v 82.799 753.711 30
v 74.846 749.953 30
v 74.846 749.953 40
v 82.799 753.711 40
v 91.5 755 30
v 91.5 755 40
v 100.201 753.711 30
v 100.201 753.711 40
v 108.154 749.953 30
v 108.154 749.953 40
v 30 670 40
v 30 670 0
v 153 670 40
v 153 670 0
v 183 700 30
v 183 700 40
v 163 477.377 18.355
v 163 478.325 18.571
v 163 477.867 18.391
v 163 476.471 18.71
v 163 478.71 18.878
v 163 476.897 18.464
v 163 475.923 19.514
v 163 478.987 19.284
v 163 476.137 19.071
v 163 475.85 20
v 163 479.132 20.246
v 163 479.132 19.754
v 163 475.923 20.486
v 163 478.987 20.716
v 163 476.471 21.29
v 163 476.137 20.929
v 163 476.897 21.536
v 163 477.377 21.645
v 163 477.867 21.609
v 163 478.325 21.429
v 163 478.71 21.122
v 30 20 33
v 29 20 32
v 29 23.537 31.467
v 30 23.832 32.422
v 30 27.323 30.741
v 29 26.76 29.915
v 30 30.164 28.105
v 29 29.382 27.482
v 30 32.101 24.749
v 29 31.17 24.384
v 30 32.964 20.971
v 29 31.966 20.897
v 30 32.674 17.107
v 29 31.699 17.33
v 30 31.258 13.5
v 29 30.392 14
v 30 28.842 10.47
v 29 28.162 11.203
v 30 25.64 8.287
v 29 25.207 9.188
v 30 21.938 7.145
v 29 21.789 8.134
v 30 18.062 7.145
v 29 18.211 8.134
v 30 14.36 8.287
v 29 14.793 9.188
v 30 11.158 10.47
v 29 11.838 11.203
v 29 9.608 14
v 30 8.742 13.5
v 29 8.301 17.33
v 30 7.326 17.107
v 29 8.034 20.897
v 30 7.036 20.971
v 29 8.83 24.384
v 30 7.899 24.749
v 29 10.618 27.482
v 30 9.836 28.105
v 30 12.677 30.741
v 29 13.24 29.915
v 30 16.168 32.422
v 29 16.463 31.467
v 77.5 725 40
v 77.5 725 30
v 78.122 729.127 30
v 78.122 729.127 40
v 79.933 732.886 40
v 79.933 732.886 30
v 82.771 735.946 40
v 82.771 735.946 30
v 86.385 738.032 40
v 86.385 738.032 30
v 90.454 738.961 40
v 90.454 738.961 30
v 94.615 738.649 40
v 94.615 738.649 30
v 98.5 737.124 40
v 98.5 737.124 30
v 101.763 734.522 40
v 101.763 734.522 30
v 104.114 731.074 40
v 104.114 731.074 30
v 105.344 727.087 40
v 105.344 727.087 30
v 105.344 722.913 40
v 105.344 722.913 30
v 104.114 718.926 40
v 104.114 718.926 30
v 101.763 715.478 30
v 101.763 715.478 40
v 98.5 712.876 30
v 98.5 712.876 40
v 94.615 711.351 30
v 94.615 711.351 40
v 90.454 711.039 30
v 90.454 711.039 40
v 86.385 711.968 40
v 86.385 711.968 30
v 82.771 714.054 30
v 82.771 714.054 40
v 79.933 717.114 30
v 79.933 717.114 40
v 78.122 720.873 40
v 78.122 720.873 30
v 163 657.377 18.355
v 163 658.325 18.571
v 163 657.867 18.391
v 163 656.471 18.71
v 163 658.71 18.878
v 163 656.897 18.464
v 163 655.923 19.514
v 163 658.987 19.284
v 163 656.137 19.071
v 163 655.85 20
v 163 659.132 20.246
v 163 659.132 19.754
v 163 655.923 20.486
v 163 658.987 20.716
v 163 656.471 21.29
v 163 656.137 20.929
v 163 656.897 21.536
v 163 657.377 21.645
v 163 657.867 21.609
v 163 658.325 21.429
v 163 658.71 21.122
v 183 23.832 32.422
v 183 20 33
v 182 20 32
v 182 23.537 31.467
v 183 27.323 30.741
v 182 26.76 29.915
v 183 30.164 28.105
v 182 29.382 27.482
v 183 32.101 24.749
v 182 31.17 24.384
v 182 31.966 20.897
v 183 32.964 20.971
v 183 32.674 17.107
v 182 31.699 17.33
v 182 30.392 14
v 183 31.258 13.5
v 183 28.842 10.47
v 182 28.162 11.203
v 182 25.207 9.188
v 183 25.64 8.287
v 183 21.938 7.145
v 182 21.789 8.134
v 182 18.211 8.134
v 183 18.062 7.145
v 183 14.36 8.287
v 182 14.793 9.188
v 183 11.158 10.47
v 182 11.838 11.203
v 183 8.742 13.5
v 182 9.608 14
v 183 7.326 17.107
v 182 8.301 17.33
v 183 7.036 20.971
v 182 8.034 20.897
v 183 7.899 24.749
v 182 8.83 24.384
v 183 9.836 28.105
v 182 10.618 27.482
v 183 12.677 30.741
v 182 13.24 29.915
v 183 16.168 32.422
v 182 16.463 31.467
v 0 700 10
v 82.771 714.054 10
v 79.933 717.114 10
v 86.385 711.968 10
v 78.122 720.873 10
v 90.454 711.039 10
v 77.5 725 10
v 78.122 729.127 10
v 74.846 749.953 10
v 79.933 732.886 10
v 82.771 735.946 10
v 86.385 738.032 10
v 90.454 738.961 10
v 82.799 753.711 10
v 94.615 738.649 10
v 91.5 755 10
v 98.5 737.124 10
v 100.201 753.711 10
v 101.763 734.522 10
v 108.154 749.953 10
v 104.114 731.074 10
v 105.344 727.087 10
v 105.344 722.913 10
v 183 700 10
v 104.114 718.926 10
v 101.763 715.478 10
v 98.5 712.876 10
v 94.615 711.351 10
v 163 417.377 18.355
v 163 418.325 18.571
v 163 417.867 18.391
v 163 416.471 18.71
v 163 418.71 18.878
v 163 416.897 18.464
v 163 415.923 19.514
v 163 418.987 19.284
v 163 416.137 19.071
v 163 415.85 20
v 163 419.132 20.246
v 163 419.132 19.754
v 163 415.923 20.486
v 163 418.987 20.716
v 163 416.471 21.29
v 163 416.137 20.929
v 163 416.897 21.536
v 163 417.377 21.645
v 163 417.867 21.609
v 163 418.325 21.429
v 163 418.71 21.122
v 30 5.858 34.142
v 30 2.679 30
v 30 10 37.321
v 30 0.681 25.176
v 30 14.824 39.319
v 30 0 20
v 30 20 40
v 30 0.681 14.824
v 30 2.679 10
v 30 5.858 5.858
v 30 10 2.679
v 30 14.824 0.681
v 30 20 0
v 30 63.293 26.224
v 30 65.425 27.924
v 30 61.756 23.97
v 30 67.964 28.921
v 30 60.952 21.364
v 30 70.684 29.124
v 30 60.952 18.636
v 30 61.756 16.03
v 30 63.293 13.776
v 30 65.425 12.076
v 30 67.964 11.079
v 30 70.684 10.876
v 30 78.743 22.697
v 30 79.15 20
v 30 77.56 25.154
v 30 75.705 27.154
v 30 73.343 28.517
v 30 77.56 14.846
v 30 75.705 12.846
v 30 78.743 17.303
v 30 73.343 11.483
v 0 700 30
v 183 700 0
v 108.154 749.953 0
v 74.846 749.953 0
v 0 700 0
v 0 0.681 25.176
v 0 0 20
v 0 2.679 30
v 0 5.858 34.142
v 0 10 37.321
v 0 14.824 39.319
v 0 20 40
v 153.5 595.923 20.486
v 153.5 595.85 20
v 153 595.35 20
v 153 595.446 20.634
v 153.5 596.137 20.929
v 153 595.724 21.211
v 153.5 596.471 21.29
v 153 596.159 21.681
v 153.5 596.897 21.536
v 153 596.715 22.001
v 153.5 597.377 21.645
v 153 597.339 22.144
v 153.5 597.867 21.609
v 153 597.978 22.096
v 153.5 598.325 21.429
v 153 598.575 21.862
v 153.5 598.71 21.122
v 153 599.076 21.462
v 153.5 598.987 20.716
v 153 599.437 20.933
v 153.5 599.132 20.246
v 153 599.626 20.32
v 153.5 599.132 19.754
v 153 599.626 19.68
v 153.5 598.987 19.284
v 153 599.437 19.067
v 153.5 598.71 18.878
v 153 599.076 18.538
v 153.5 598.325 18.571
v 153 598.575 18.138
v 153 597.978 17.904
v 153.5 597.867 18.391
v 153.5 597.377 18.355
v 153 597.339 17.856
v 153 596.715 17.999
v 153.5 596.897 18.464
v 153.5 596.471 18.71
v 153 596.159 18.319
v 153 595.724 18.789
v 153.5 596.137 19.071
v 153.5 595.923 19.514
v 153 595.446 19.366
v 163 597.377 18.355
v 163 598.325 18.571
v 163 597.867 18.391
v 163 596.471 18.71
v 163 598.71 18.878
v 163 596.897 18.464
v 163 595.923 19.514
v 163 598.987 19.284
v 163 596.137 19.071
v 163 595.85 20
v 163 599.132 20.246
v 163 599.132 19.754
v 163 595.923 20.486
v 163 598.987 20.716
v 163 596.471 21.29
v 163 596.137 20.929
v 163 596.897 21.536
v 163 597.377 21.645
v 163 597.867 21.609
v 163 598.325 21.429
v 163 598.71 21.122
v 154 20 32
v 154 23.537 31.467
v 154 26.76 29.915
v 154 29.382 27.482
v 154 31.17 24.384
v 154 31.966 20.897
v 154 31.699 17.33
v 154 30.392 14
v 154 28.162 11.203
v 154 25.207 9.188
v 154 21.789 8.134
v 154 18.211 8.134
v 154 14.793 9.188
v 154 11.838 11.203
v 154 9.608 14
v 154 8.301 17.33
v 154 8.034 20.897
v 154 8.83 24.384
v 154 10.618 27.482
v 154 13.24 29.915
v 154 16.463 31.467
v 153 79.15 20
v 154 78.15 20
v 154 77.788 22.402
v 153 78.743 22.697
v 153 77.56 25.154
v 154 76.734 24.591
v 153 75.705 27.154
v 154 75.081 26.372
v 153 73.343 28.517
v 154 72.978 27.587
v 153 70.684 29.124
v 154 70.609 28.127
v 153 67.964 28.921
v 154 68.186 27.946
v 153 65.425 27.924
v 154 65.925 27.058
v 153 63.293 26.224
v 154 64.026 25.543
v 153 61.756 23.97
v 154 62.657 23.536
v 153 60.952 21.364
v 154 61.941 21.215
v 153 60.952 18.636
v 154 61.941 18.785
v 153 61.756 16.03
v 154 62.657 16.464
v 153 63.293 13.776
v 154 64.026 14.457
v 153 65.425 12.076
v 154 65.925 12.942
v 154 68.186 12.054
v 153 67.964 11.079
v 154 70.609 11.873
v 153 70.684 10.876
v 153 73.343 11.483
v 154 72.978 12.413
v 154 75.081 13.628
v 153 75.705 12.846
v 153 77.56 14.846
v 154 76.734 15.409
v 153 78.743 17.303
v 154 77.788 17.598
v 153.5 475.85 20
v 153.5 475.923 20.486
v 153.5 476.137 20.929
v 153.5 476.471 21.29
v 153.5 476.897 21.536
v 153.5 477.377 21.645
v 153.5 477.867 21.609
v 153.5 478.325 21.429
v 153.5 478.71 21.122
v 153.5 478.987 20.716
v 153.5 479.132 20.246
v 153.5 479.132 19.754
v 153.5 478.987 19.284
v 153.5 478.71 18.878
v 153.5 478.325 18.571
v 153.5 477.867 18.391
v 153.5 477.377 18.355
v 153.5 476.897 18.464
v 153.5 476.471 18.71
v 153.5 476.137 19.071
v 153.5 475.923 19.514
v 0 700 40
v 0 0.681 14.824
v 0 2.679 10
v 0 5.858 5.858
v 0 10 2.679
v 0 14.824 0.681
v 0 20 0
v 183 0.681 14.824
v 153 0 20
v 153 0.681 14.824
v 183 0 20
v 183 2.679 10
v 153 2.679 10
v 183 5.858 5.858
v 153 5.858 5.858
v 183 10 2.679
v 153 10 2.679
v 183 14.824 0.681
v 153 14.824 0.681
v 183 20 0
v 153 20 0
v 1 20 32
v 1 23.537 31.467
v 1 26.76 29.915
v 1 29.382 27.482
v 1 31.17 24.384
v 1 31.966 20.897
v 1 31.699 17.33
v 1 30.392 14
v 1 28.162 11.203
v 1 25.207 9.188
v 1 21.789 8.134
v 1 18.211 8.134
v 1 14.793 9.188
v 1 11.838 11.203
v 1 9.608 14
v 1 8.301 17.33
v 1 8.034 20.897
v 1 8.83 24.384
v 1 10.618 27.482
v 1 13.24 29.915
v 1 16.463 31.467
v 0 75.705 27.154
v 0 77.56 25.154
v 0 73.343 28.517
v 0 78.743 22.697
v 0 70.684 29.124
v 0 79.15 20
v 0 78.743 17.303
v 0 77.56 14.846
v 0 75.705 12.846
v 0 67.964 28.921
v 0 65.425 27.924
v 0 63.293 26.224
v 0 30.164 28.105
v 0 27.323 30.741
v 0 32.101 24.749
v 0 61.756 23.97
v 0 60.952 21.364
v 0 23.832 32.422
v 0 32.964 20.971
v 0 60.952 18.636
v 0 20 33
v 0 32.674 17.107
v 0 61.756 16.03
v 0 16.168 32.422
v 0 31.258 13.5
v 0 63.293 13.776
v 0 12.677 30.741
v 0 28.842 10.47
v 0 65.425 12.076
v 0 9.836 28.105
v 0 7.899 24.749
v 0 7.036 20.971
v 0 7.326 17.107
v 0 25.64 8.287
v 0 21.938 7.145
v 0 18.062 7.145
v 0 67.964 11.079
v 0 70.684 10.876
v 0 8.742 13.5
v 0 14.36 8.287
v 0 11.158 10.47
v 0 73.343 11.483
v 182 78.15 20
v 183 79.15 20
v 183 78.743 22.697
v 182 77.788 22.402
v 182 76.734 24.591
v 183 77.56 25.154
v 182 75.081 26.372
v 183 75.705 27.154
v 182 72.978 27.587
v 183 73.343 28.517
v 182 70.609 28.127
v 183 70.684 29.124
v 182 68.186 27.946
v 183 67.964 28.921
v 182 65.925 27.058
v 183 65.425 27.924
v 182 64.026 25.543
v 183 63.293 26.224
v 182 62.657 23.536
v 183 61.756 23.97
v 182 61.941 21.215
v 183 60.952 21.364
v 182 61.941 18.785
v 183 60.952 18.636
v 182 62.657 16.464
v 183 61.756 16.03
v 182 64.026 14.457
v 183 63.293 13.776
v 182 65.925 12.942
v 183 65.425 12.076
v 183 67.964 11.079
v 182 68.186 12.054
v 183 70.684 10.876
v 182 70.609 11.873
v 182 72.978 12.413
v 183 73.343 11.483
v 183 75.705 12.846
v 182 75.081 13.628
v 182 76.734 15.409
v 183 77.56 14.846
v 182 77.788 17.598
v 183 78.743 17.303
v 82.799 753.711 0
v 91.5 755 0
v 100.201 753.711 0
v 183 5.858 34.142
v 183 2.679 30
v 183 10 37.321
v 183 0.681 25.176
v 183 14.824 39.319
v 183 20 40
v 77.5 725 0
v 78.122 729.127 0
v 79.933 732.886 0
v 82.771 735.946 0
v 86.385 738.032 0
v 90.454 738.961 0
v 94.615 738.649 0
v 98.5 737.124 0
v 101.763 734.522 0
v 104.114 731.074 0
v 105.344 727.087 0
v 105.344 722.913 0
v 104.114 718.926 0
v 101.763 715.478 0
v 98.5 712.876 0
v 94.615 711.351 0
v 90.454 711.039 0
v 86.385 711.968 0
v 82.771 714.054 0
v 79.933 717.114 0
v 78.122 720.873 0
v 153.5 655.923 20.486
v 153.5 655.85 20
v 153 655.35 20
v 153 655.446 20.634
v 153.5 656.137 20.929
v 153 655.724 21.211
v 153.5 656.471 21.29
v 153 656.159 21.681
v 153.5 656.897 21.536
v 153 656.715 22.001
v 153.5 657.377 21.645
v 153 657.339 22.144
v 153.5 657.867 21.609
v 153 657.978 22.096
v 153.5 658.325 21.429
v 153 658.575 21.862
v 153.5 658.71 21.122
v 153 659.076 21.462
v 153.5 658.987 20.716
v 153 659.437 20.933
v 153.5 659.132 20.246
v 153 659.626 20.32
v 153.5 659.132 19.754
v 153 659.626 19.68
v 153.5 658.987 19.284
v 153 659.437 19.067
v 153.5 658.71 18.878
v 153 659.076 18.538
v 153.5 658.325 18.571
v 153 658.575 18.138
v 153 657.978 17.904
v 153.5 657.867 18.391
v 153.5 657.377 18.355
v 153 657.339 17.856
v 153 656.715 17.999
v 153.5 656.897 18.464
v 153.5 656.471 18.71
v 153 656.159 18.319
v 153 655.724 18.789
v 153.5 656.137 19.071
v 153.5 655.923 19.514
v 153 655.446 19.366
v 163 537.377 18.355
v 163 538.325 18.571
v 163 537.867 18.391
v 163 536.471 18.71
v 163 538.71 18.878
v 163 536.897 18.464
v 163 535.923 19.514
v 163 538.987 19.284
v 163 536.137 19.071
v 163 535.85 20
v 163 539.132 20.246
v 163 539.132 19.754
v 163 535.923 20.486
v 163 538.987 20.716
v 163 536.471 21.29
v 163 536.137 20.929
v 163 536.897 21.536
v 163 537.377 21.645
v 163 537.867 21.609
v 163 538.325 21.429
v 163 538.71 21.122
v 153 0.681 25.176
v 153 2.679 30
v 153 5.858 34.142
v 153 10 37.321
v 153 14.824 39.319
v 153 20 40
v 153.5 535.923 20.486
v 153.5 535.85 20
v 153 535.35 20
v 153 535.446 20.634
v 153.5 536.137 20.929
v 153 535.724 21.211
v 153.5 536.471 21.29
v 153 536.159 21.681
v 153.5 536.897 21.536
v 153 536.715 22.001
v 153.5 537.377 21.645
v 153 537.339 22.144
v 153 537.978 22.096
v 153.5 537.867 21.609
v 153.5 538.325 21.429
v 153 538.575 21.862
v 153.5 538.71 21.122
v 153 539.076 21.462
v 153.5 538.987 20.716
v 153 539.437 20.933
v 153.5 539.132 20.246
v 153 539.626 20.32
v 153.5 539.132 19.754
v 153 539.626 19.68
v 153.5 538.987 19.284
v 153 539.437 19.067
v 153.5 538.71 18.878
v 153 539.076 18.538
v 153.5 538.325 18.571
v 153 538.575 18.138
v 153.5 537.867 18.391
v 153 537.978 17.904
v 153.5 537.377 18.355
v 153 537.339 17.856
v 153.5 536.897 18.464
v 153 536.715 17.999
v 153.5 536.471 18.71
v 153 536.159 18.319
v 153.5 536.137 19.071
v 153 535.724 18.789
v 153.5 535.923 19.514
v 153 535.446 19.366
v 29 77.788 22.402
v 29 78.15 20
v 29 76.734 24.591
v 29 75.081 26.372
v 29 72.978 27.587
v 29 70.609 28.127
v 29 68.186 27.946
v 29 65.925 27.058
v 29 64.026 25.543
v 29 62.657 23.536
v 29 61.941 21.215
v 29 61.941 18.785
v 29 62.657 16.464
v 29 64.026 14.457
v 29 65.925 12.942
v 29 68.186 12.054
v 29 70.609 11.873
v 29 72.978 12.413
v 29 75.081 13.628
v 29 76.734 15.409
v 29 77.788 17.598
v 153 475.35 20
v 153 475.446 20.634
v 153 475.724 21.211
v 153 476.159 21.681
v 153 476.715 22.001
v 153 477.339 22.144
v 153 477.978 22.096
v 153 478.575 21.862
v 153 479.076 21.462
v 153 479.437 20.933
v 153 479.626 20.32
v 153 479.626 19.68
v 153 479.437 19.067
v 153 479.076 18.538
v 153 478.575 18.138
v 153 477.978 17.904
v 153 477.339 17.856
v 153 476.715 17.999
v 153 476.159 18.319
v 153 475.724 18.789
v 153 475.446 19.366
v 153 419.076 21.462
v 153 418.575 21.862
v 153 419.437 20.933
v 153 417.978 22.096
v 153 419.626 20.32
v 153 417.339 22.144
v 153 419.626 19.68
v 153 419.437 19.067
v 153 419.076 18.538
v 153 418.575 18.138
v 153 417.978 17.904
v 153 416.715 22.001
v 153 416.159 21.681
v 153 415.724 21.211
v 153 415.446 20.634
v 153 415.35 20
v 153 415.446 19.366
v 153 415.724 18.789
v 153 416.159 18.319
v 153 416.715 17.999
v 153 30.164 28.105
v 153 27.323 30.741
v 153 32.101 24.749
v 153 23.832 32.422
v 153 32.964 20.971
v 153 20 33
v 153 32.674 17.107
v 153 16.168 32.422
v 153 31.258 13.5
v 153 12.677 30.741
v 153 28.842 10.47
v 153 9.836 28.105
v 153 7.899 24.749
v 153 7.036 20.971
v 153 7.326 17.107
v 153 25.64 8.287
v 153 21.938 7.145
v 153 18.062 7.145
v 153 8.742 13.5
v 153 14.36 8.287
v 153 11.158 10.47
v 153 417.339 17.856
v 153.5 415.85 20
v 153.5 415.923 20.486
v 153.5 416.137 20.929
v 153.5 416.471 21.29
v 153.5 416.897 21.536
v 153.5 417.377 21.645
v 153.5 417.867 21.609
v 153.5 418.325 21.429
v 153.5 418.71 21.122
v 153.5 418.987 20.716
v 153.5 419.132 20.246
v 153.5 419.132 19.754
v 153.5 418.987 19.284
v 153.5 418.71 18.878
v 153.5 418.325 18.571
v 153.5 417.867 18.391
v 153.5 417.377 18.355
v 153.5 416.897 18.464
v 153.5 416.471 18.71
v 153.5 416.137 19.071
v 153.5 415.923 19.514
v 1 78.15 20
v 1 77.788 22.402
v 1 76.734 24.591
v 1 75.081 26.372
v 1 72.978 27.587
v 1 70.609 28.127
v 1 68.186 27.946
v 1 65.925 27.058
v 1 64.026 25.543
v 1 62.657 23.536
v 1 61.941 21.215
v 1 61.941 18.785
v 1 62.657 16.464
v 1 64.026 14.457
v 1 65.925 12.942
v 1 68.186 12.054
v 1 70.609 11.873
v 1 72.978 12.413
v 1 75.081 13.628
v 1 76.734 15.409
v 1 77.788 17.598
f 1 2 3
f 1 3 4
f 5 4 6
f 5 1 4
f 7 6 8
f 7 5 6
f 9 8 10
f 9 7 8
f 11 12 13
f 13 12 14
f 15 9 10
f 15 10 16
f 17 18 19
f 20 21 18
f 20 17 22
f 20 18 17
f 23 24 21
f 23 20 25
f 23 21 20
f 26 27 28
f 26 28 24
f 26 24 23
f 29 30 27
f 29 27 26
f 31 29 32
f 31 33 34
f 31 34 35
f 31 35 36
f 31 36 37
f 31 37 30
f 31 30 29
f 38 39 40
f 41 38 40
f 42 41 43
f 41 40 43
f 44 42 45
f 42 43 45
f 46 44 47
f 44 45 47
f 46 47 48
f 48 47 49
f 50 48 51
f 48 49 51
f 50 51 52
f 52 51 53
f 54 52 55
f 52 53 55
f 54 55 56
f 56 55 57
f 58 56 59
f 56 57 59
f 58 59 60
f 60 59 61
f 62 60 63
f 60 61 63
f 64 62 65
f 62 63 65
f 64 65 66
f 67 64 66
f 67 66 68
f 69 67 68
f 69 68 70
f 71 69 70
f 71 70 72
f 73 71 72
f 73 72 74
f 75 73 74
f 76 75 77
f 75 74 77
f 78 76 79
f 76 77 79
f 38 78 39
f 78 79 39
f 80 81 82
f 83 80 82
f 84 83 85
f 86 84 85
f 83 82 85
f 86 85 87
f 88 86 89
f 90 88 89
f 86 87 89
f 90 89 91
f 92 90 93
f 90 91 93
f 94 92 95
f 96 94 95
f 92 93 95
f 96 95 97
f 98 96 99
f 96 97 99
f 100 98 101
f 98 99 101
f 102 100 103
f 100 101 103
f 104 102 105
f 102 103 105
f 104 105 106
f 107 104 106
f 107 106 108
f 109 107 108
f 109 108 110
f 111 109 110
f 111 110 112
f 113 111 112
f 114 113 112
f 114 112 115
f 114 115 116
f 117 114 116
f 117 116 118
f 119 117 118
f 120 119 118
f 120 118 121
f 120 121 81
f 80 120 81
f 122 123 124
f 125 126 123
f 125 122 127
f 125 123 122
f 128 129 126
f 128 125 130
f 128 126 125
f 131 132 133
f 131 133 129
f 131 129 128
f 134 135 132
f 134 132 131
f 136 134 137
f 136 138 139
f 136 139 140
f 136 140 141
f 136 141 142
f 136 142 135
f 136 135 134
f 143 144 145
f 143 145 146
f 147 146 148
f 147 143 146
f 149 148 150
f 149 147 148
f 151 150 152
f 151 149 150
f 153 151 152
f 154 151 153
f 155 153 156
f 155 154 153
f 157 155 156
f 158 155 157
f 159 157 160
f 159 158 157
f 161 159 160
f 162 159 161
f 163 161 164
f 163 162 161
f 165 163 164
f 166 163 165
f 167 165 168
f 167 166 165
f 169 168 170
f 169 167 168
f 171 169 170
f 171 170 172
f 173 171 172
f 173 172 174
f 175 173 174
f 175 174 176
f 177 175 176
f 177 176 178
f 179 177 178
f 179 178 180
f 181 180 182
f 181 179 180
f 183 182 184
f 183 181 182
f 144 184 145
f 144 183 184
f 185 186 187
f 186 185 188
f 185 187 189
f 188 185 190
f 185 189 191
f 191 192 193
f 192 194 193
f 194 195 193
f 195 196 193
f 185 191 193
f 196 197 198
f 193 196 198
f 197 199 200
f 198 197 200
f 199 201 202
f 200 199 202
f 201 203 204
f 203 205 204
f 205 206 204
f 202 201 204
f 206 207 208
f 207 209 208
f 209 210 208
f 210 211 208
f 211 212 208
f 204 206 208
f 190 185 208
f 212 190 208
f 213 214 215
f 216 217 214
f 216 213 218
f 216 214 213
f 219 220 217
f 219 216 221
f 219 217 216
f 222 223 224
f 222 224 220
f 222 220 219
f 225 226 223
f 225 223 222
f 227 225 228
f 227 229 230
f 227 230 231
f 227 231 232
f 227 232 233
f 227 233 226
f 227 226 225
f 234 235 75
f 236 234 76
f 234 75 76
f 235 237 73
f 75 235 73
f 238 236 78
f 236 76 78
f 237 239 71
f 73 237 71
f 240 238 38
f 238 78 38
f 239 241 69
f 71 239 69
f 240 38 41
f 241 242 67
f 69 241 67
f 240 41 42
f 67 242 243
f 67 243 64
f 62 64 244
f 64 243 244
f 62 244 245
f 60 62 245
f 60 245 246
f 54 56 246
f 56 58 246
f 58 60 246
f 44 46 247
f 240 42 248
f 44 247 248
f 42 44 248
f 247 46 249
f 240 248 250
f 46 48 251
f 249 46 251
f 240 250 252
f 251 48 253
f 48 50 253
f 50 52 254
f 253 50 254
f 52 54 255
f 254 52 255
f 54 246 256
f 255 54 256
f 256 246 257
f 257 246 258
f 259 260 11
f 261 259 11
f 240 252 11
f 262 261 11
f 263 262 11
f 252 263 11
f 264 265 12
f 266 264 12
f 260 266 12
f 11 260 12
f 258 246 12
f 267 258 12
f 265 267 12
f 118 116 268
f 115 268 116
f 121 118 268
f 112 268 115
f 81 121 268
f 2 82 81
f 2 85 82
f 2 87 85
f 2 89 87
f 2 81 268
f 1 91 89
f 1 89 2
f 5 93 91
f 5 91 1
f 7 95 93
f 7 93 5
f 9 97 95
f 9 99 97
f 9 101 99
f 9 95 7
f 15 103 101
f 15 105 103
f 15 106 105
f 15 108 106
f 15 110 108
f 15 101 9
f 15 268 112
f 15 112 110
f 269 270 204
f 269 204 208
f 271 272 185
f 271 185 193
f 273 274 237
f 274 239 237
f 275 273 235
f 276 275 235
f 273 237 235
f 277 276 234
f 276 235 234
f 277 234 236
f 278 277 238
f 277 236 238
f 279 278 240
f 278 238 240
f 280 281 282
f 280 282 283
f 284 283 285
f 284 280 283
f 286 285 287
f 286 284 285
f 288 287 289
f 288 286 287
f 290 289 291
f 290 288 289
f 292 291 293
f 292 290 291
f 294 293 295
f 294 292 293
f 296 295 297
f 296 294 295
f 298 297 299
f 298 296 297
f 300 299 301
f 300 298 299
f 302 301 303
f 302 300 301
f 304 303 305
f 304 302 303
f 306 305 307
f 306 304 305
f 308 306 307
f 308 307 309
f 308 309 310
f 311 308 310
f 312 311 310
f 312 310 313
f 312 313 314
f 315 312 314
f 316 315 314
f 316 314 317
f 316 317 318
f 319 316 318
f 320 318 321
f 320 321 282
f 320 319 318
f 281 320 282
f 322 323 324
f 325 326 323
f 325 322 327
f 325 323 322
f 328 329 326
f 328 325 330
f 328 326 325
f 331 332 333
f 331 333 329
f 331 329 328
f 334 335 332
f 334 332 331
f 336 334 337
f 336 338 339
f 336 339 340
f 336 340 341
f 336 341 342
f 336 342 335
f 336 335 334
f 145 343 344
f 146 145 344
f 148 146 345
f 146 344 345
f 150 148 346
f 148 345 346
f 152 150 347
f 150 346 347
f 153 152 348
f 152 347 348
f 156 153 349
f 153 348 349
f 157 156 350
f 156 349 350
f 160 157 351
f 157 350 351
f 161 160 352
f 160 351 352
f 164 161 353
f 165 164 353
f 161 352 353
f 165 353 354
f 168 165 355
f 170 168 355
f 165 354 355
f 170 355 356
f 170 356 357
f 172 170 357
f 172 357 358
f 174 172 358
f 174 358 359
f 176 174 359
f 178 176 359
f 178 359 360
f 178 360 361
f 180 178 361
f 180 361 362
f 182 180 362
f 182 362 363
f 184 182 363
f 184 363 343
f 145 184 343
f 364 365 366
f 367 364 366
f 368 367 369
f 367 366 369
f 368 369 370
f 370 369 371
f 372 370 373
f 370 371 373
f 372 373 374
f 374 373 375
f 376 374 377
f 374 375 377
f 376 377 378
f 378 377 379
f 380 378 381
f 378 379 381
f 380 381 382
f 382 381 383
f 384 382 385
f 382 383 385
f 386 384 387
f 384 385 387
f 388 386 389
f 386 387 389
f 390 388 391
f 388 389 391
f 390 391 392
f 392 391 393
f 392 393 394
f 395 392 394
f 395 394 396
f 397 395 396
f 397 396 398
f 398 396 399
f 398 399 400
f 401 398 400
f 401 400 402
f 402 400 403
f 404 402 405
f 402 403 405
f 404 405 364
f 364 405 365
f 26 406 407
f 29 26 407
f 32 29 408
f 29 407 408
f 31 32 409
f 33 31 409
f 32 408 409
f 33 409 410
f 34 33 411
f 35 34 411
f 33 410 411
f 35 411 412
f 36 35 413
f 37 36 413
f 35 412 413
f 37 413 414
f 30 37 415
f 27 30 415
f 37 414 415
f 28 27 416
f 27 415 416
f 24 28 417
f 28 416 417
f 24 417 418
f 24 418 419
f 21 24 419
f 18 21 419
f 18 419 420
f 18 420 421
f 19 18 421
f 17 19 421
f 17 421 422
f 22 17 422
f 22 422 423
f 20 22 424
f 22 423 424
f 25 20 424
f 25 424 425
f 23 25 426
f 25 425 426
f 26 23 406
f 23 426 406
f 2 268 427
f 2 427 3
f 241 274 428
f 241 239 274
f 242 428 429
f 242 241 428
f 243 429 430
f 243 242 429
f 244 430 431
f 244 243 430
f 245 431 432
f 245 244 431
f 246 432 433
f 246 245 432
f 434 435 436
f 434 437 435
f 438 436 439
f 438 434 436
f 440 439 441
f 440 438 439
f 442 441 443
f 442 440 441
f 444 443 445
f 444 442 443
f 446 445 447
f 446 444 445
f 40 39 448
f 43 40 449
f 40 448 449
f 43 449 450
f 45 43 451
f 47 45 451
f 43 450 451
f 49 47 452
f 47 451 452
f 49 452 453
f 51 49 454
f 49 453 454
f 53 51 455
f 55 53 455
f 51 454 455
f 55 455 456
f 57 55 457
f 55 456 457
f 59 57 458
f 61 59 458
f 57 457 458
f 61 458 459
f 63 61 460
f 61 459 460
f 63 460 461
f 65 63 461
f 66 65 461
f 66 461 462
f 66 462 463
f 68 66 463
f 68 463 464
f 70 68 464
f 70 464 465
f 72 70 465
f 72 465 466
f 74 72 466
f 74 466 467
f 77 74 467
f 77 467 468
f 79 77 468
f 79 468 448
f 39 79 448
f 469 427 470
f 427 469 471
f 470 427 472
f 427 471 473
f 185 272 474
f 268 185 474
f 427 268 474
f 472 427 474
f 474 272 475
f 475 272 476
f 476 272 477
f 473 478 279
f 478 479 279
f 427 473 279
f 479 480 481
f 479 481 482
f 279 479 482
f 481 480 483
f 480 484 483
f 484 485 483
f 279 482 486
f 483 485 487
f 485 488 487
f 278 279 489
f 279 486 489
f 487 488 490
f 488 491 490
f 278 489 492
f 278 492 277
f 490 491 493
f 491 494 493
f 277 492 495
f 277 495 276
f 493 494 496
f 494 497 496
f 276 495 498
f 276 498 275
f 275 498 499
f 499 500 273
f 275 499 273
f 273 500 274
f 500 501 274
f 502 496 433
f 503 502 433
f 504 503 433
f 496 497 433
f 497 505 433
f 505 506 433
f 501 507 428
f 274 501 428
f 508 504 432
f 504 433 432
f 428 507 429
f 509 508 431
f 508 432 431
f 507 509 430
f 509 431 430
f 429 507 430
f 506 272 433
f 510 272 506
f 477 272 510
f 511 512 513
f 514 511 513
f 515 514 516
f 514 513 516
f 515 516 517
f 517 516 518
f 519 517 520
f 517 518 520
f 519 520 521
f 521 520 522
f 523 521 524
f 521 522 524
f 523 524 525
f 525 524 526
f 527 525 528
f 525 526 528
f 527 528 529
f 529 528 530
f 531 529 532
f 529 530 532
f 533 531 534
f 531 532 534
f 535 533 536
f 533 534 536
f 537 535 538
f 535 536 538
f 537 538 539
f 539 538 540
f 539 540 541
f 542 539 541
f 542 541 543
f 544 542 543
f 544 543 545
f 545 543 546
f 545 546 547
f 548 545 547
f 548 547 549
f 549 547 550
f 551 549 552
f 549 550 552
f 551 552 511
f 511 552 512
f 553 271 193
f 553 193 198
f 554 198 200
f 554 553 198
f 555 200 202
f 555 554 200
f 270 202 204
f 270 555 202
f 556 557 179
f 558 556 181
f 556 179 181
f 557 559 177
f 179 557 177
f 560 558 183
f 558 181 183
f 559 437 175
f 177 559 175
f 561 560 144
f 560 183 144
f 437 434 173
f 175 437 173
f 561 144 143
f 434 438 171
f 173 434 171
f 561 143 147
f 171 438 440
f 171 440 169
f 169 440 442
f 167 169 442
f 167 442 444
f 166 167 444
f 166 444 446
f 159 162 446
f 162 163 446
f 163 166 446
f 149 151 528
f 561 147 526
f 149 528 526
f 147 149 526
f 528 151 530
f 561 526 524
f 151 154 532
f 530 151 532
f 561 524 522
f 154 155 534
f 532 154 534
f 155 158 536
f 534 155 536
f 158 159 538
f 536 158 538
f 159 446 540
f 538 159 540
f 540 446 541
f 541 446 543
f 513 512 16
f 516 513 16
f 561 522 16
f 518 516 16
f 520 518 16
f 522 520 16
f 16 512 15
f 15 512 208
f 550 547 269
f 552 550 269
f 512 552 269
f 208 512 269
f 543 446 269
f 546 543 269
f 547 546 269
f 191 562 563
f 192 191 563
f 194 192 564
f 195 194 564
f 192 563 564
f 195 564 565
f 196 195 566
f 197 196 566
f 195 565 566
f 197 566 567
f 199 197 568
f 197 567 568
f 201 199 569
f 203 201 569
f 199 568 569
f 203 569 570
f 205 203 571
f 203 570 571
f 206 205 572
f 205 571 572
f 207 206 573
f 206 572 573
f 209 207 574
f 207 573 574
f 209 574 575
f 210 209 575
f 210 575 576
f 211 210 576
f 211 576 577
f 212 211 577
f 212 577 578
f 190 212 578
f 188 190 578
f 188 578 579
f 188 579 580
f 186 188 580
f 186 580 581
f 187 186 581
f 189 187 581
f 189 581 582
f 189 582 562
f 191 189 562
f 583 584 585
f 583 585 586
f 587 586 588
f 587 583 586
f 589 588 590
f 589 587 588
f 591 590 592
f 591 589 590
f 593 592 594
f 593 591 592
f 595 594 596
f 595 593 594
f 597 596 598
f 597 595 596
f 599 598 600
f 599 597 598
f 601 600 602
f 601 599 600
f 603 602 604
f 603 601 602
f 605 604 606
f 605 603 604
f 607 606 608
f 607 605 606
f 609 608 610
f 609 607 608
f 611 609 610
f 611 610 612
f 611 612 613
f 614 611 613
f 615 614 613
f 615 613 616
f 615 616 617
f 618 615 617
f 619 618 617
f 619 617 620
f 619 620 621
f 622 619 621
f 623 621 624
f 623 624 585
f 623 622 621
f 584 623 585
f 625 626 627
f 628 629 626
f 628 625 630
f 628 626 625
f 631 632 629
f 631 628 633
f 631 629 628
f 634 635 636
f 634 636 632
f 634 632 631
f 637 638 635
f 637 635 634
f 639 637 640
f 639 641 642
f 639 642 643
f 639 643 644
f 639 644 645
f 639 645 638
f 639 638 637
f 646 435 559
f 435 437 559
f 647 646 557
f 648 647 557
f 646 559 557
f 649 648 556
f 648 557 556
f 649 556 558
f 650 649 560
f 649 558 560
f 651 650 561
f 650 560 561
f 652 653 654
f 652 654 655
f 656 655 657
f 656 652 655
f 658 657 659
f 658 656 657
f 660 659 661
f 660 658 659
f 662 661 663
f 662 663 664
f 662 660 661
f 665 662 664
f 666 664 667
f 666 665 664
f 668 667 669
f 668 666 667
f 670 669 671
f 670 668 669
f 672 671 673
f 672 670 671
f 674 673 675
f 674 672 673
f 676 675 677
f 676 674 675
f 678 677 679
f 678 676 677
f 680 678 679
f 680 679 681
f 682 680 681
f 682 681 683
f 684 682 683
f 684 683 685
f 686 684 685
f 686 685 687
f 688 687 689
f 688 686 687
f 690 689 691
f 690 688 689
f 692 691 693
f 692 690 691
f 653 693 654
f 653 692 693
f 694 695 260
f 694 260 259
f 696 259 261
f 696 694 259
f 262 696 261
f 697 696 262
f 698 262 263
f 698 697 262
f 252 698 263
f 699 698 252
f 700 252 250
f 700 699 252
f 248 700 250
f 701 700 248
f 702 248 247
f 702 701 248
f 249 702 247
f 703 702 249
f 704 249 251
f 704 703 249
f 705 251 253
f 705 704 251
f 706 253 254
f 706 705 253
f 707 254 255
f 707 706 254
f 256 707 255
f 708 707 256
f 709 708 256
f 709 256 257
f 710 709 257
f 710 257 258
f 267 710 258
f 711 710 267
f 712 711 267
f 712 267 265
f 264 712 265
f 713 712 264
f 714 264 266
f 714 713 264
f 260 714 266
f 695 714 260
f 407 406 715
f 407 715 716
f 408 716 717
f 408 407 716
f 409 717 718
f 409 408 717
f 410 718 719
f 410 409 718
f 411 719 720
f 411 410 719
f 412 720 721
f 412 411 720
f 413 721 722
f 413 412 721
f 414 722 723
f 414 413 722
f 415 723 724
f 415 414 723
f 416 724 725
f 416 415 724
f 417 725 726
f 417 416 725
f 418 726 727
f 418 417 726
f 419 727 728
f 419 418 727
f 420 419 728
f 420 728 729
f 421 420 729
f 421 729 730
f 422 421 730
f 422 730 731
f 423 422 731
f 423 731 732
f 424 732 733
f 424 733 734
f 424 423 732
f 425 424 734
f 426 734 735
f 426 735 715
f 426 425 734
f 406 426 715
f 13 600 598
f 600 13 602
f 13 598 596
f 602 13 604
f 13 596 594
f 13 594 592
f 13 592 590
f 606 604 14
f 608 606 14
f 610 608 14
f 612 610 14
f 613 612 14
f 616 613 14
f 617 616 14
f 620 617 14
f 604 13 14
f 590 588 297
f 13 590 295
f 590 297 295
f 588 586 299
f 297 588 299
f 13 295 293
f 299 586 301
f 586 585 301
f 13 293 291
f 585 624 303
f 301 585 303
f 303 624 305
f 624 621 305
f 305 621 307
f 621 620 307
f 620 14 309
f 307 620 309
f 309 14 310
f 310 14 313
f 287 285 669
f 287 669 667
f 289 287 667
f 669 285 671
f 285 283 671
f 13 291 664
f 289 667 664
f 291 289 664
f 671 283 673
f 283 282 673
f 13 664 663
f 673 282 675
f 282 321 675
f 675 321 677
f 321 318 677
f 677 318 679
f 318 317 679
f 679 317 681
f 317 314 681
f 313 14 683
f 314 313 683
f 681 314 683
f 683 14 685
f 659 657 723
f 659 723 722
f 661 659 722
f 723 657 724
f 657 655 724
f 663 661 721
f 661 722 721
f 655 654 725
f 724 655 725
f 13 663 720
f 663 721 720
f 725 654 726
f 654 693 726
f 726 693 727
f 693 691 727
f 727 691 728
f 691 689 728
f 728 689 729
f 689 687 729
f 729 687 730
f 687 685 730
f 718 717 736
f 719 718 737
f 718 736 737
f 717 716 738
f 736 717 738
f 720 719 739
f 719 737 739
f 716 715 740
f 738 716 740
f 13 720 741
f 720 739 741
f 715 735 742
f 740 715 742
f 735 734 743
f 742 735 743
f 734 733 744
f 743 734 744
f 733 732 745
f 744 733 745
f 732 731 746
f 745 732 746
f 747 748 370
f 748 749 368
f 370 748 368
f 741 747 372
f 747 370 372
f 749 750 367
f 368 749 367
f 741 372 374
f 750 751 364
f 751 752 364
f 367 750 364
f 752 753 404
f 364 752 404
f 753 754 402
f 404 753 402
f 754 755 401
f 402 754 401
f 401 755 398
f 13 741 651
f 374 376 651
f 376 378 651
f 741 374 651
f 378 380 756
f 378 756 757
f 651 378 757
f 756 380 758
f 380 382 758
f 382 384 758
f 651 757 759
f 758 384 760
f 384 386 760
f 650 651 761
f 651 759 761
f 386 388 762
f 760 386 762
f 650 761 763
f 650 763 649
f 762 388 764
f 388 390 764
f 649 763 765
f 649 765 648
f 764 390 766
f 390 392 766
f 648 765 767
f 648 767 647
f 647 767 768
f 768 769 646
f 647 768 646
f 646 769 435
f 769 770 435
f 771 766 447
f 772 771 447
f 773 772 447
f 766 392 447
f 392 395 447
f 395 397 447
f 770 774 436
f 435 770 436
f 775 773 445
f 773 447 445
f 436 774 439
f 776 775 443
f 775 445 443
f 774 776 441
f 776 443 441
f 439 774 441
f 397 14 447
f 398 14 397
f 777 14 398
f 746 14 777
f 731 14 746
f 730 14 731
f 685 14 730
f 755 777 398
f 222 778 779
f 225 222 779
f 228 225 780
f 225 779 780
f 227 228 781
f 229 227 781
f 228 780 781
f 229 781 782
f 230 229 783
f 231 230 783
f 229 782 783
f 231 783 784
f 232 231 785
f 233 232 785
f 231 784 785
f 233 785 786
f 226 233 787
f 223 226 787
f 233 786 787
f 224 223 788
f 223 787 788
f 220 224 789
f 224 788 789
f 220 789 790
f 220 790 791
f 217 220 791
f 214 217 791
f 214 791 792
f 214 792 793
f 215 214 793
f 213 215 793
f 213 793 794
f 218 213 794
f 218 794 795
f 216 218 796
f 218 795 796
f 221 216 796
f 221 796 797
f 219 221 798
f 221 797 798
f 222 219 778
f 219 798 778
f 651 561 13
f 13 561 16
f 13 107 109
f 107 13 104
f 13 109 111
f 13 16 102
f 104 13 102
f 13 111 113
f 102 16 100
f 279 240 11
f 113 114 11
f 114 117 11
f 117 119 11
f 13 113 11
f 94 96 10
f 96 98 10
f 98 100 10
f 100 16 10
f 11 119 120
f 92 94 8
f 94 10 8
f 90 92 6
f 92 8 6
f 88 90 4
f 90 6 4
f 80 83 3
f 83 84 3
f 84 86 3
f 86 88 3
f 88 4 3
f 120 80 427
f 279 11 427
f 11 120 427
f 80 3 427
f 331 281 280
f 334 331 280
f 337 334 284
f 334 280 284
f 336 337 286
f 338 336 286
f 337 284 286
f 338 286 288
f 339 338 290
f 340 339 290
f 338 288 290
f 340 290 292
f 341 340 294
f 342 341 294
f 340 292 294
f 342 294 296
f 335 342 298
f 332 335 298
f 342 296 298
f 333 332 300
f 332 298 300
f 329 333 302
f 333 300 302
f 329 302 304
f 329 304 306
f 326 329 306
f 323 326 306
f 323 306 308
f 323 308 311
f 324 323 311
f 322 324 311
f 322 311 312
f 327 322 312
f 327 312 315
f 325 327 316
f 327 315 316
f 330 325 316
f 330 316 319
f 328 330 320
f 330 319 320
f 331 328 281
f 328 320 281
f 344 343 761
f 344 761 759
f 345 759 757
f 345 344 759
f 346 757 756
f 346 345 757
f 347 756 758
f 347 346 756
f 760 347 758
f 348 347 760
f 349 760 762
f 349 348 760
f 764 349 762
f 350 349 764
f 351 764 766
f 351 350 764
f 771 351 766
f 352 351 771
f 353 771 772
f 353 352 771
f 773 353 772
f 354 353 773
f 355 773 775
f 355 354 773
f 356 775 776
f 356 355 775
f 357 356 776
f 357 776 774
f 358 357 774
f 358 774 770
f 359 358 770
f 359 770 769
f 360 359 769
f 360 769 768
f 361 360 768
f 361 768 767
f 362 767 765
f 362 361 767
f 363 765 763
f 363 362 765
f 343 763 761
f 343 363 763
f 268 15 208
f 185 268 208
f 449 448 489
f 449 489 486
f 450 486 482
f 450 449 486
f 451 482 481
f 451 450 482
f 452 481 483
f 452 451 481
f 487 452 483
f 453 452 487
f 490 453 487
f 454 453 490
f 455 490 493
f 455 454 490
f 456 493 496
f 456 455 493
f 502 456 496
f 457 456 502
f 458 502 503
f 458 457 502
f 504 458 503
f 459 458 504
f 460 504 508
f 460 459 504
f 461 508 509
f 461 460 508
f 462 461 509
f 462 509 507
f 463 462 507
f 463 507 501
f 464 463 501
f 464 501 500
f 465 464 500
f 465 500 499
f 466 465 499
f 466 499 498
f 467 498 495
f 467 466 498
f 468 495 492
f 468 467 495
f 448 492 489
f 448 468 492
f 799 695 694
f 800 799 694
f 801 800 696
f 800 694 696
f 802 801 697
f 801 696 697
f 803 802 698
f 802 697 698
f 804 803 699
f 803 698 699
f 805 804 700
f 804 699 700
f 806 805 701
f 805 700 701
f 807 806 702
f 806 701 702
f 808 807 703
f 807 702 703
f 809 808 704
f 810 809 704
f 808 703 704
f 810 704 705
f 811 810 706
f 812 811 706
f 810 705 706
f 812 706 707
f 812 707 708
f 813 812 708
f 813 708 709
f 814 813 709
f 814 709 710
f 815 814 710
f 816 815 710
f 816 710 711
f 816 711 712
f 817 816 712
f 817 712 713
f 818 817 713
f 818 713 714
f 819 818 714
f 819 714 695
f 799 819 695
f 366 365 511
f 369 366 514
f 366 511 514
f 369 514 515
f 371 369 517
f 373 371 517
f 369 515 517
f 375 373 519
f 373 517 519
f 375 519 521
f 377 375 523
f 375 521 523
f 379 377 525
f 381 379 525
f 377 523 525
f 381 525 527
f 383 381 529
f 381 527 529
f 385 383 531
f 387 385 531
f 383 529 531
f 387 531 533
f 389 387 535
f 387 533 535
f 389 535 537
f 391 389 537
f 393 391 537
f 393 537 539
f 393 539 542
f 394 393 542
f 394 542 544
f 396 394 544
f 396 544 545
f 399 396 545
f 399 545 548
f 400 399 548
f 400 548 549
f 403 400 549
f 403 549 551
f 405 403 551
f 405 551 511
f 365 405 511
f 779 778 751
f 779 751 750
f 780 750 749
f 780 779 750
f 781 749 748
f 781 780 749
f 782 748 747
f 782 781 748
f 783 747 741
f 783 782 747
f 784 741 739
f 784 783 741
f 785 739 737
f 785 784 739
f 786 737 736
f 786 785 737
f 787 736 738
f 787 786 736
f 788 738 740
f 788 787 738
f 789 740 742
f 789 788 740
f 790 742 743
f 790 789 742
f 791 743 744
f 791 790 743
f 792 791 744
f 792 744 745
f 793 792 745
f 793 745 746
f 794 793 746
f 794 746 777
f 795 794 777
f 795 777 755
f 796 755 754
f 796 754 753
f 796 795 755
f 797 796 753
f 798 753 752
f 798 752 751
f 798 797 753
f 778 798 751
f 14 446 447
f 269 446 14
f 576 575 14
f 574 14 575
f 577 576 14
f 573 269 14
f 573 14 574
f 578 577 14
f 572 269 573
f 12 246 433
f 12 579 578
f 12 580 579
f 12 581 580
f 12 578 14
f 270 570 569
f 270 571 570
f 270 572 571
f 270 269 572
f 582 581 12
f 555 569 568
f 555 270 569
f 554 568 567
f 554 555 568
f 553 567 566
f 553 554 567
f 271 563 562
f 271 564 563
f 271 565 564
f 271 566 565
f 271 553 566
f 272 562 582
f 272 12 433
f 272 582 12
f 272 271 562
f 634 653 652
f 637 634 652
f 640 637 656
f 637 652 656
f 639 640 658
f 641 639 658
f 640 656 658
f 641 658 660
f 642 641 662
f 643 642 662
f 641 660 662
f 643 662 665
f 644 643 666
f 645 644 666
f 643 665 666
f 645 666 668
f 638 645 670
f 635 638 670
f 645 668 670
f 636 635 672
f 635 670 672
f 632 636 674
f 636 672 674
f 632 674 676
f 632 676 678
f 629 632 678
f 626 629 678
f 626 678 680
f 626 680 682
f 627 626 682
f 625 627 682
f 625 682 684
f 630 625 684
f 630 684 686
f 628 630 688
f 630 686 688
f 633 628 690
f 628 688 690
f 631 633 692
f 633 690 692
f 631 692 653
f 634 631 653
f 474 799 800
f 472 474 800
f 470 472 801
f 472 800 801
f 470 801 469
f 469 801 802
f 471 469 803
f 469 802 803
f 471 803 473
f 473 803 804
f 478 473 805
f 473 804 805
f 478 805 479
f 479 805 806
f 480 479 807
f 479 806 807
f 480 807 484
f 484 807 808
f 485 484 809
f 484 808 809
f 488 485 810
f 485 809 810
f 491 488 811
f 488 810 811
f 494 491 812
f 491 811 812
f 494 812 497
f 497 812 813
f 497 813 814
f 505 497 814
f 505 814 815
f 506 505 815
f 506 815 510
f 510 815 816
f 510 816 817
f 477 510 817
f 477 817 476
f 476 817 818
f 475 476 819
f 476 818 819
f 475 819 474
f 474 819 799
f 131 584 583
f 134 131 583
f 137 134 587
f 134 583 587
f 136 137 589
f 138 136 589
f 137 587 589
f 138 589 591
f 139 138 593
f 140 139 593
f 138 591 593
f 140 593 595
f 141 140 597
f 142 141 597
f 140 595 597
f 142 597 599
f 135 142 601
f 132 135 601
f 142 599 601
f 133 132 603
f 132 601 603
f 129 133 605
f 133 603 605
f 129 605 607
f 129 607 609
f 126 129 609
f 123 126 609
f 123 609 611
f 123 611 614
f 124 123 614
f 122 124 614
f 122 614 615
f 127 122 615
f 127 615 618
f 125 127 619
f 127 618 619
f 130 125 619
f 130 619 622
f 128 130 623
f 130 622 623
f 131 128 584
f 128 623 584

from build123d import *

# Parameters (mm, degrees)
DODANIE_WYCI_GNI_CIE1_DEPTH = 40
ZAOKR_GLENIE1_R             = 20
SZKIC2_R                    = 12
WYTNIJ_WYCI_GNI_CIE1_DEPTH  = 725.630250542
SZKIC3_R                    = 8.15
WYTNIJ_WYCI_GNI_CIE2_DEPTH  = 725.630250542
SZKIC5_R                    = 14
DODANIE_WYCI_GNI_CIE2_DEPTH = 40
SZKIC6_W                    = 20
SZKIC6_H                    = 55
WYTNIJ_WYCI_GNI_CIE4_DEPTH  = 778.890737829
SZKIC4_R                    = 1.65
WYTNIJ_WYCI_GNI_CIE5_DEPTH  = 10
SFAZOWANIE1_SIZE            = 0.5
SFAZOWANIE2_SIZE            = 1


with BuildPart() as part:
    # Szkic1 → Dodanie-wyciągnięcie1 (new body)
    with BuildSketch(Plane.XY):
        Polygon((0, 0), (30, 0), (30, 670), (153, 670), (153, 0), (183, 0), (183, 700), (110, 700), (30, 700), (0, 700), align=None)
    extrude(amount=DODANIE_WYCI_GNI_CIE1_DEPTH)

    # Zaokrąglenie1
    zaokr_glenie1_edges = [part.edges().sort_by_distance(p)[0] for p in [
        (168, 0, 0),
        (168, 0, 40),
        (15, 0, 0),
        (15, 0, 40),
    ]]
    fillet(zaokr_glenie1_edges, radius=ZAOKR_GLENIE1_R - 0.0001)  # a hair under: the kernel refuses the full size

    # Szkic2 → Wytnij-wyciągnięcie1 (cut, through all)
    with BuildSketch(Plane.ZY):
        with Locations((20, 20)):
            Circle(SZKIC2_R)
    extrude(amount=-WYTNIJ_WYCI_GNI_CIE1_DEPTH, mode=Mode.SUBTRACT)

    # Szkic3 → Wytnij-wyciągnięcie2 (cut, through all)
    with BuildSketch(Plane(origin=(183, 0, 0), x_dir=(0, 0, -1), z_dir=(1, 0, 0))):
        with Locations(Location((-20, 70, 0), (0, 0, 90))):
            Circle(SZKIC3_R)
    extrude(amount=-WYTNIJ_WYCI_GNI_CIE2_DEPTH, mode=Mode.SUBTRACT)

    # Szkic5 → Dodanie-wyciągnięcie2 (add)
    with BuildSketch(Plane(origin=(0, 0, 0), x_dir=(-1, 0, 0), z_dir=(0, 0, -1))):
        with BuildLine():
            Line((-183, 700), (0, 700))
            Line((0, 700), (-74.84618459, 749.952964399))
            ThreePointArc((-74.84618459, 749.952964399), (-91.5, 755), (-108.15381541, 749.952964399))
            Line((-108.15381541, 749.952964399), (-183, 700))
        make_face()
        with Locations((-91.5, 725)):
            Circle(SZKIC5_R, mode=Mode.SUBTRACT)
    extrude(amount=-DODANIE_WYCI_GNI_CIE2_DEPTH)

    # Szkic6 → Wytnij-wyciągnięcie4 (cut, through all)
    with BuildSketch(Plane(origin=(183, 0, 0), x_dir=(0, 0, -1), z_dir=(1, 0, 0))):
        with Locations((-20, 727.5)):
            Rectangle(SZKIC6_W, SZKIC6_H)
    extrude(amount=-WYTNIJ_WYCI_GNI_CIE4_DEPTH, mode=Mode.SUBTRACT)

    # Szkic4 → Wytnij-wyciągnięcie5 (cut)
    with BuildSketch(Plane.ZY.offset(-153)):
        with Locations(Location((20, 657.5, 0), (0, 0, 270))):
            Circle(SZKIC4_R)
        with Locations(Location((20, 597.5, 0), (0, 0, 270))):
            Circle(SZKIC4_R)
        with Locations(Location((20, 537.5, 0), (0, 0, 270))):
            Circle(SZKIC4_R)
        with Locations(Location((20, 477.5, 0), (0, 0, 270))):
            Circle(SZKIC4_R)
        with Locations(Location((20, 417.5, 0), (0, 0, 270))):
            Circle(SZKIC4_R)
    extrude(amount=-WYTNIJ_WYCI_GNI_CIE5_DEPTH, mode=Mode.SUBTRACT)

    # Sfazowanie1
    sfazowanie1_edges = [part.edges().sort_by_distance(p)[0] for p in [
        (153, 659.15, 20),
        (153, 599.15, 20),
        (153, 539.15, 20),
        (153, 479.15, 20),
        (153, 419.15, 20),
    ]]
    chamfer(sfazowanie1_edges, length=SFAZOWANIE1_SIZE)

    # Sfazowanie2
    sfazowanie2_edges = [part.edges().sort_by_distance(p)[0] for p in [
        (30, 20, 8),
        (183, 20, 8),
        (153, 20, 8),
        (0, 20, 8),
        (0, 61.85, 20),
        (30, 61.85, 20),
        (153, 61.85, 20),
        (183, 61.85, 20),
    ]]
    chamfer(sfazowanie2_edges, length=SFAZOWANIE2_SIZE)


solid = part.part
